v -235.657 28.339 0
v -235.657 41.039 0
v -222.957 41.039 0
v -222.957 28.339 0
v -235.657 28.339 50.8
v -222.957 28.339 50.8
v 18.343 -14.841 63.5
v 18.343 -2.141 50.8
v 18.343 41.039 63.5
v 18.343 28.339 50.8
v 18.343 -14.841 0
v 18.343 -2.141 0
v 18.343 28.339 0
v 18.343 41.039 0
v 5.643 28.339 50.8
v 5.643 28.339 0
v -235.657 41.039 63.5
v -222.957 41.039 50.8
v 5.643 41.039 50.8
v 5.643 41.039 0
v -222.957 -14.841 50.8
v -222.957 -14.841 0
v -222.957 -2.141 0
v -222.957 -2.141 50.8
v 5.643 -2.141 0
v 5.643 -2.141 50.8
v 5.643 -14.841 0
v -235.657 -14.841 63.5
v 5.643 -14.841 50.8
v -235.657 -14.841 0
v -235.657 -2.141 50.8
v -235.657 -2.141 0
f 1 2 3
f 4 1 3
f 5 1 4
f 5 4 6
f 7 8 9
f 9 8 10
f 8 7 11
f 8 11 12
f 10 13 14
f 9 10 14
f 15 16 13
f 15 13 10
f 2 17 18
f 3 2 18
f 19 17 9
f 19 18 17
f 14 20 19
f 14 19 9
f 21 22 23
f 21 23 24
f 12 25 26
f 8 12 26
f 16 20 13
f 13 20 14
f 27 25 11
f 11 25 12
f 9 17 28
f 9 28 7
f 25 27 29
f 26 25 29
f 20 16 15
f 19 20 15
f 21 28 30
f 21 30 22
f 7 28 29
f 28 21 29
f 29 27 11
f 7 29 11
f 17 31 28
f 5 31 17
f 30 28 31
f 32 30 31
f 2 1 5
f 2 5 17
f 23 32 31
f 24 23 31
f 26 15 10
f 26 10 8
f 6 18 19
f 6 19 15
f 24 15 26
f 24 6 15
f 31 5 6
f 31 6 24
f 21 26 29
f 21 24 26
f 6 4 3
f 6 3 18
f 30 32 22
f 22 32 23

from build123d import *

# Parameters (mm, degrees)
F0_W     = 254
F0_H     = 55.88
F1_DEPTH = 63.5
F2_W     = 228.6
F2_H     = 50.8
F3_DEPTH = 55.881
F4_W     = 30.48
F4_H     = 50.8
F5_DEPTH = 254.001


with BuildPart() as f1:
    # F0 (on Top) → F1 (new body)
    with BuildSketch(Plane.XY):
        with Locations((-108.656693, 13.099435)):
            Rectangle(F0_W, F0_H)
    extrude(amount=F1_DEPTH)

    # F2 (on face) → F3 (cut, through all)
    with BuildSketch(Plane.XZ.offset(14.840565)):
        with Locations((-108.656693, 25.4)):
            Rectangle(F2_W, F2_H)
    extrude(amount=-F3_DEPTH, mode=Mode.SUBTRACT)

    # F4 (on face) → F5 (cut, through all)
    with BuildSketch(Plane(origin=(-235.656693, 0, 0), x_dir=(0, -1, 0), z_dir=(-1, 0, 0))):
        with Locations((-13.099435, 25.4)):
            Rectangle(F4_W, F4_H)
    extrude(amount=-F5_DEPTH, mode=Mode.SUBTRACT)


solid = f1.part
